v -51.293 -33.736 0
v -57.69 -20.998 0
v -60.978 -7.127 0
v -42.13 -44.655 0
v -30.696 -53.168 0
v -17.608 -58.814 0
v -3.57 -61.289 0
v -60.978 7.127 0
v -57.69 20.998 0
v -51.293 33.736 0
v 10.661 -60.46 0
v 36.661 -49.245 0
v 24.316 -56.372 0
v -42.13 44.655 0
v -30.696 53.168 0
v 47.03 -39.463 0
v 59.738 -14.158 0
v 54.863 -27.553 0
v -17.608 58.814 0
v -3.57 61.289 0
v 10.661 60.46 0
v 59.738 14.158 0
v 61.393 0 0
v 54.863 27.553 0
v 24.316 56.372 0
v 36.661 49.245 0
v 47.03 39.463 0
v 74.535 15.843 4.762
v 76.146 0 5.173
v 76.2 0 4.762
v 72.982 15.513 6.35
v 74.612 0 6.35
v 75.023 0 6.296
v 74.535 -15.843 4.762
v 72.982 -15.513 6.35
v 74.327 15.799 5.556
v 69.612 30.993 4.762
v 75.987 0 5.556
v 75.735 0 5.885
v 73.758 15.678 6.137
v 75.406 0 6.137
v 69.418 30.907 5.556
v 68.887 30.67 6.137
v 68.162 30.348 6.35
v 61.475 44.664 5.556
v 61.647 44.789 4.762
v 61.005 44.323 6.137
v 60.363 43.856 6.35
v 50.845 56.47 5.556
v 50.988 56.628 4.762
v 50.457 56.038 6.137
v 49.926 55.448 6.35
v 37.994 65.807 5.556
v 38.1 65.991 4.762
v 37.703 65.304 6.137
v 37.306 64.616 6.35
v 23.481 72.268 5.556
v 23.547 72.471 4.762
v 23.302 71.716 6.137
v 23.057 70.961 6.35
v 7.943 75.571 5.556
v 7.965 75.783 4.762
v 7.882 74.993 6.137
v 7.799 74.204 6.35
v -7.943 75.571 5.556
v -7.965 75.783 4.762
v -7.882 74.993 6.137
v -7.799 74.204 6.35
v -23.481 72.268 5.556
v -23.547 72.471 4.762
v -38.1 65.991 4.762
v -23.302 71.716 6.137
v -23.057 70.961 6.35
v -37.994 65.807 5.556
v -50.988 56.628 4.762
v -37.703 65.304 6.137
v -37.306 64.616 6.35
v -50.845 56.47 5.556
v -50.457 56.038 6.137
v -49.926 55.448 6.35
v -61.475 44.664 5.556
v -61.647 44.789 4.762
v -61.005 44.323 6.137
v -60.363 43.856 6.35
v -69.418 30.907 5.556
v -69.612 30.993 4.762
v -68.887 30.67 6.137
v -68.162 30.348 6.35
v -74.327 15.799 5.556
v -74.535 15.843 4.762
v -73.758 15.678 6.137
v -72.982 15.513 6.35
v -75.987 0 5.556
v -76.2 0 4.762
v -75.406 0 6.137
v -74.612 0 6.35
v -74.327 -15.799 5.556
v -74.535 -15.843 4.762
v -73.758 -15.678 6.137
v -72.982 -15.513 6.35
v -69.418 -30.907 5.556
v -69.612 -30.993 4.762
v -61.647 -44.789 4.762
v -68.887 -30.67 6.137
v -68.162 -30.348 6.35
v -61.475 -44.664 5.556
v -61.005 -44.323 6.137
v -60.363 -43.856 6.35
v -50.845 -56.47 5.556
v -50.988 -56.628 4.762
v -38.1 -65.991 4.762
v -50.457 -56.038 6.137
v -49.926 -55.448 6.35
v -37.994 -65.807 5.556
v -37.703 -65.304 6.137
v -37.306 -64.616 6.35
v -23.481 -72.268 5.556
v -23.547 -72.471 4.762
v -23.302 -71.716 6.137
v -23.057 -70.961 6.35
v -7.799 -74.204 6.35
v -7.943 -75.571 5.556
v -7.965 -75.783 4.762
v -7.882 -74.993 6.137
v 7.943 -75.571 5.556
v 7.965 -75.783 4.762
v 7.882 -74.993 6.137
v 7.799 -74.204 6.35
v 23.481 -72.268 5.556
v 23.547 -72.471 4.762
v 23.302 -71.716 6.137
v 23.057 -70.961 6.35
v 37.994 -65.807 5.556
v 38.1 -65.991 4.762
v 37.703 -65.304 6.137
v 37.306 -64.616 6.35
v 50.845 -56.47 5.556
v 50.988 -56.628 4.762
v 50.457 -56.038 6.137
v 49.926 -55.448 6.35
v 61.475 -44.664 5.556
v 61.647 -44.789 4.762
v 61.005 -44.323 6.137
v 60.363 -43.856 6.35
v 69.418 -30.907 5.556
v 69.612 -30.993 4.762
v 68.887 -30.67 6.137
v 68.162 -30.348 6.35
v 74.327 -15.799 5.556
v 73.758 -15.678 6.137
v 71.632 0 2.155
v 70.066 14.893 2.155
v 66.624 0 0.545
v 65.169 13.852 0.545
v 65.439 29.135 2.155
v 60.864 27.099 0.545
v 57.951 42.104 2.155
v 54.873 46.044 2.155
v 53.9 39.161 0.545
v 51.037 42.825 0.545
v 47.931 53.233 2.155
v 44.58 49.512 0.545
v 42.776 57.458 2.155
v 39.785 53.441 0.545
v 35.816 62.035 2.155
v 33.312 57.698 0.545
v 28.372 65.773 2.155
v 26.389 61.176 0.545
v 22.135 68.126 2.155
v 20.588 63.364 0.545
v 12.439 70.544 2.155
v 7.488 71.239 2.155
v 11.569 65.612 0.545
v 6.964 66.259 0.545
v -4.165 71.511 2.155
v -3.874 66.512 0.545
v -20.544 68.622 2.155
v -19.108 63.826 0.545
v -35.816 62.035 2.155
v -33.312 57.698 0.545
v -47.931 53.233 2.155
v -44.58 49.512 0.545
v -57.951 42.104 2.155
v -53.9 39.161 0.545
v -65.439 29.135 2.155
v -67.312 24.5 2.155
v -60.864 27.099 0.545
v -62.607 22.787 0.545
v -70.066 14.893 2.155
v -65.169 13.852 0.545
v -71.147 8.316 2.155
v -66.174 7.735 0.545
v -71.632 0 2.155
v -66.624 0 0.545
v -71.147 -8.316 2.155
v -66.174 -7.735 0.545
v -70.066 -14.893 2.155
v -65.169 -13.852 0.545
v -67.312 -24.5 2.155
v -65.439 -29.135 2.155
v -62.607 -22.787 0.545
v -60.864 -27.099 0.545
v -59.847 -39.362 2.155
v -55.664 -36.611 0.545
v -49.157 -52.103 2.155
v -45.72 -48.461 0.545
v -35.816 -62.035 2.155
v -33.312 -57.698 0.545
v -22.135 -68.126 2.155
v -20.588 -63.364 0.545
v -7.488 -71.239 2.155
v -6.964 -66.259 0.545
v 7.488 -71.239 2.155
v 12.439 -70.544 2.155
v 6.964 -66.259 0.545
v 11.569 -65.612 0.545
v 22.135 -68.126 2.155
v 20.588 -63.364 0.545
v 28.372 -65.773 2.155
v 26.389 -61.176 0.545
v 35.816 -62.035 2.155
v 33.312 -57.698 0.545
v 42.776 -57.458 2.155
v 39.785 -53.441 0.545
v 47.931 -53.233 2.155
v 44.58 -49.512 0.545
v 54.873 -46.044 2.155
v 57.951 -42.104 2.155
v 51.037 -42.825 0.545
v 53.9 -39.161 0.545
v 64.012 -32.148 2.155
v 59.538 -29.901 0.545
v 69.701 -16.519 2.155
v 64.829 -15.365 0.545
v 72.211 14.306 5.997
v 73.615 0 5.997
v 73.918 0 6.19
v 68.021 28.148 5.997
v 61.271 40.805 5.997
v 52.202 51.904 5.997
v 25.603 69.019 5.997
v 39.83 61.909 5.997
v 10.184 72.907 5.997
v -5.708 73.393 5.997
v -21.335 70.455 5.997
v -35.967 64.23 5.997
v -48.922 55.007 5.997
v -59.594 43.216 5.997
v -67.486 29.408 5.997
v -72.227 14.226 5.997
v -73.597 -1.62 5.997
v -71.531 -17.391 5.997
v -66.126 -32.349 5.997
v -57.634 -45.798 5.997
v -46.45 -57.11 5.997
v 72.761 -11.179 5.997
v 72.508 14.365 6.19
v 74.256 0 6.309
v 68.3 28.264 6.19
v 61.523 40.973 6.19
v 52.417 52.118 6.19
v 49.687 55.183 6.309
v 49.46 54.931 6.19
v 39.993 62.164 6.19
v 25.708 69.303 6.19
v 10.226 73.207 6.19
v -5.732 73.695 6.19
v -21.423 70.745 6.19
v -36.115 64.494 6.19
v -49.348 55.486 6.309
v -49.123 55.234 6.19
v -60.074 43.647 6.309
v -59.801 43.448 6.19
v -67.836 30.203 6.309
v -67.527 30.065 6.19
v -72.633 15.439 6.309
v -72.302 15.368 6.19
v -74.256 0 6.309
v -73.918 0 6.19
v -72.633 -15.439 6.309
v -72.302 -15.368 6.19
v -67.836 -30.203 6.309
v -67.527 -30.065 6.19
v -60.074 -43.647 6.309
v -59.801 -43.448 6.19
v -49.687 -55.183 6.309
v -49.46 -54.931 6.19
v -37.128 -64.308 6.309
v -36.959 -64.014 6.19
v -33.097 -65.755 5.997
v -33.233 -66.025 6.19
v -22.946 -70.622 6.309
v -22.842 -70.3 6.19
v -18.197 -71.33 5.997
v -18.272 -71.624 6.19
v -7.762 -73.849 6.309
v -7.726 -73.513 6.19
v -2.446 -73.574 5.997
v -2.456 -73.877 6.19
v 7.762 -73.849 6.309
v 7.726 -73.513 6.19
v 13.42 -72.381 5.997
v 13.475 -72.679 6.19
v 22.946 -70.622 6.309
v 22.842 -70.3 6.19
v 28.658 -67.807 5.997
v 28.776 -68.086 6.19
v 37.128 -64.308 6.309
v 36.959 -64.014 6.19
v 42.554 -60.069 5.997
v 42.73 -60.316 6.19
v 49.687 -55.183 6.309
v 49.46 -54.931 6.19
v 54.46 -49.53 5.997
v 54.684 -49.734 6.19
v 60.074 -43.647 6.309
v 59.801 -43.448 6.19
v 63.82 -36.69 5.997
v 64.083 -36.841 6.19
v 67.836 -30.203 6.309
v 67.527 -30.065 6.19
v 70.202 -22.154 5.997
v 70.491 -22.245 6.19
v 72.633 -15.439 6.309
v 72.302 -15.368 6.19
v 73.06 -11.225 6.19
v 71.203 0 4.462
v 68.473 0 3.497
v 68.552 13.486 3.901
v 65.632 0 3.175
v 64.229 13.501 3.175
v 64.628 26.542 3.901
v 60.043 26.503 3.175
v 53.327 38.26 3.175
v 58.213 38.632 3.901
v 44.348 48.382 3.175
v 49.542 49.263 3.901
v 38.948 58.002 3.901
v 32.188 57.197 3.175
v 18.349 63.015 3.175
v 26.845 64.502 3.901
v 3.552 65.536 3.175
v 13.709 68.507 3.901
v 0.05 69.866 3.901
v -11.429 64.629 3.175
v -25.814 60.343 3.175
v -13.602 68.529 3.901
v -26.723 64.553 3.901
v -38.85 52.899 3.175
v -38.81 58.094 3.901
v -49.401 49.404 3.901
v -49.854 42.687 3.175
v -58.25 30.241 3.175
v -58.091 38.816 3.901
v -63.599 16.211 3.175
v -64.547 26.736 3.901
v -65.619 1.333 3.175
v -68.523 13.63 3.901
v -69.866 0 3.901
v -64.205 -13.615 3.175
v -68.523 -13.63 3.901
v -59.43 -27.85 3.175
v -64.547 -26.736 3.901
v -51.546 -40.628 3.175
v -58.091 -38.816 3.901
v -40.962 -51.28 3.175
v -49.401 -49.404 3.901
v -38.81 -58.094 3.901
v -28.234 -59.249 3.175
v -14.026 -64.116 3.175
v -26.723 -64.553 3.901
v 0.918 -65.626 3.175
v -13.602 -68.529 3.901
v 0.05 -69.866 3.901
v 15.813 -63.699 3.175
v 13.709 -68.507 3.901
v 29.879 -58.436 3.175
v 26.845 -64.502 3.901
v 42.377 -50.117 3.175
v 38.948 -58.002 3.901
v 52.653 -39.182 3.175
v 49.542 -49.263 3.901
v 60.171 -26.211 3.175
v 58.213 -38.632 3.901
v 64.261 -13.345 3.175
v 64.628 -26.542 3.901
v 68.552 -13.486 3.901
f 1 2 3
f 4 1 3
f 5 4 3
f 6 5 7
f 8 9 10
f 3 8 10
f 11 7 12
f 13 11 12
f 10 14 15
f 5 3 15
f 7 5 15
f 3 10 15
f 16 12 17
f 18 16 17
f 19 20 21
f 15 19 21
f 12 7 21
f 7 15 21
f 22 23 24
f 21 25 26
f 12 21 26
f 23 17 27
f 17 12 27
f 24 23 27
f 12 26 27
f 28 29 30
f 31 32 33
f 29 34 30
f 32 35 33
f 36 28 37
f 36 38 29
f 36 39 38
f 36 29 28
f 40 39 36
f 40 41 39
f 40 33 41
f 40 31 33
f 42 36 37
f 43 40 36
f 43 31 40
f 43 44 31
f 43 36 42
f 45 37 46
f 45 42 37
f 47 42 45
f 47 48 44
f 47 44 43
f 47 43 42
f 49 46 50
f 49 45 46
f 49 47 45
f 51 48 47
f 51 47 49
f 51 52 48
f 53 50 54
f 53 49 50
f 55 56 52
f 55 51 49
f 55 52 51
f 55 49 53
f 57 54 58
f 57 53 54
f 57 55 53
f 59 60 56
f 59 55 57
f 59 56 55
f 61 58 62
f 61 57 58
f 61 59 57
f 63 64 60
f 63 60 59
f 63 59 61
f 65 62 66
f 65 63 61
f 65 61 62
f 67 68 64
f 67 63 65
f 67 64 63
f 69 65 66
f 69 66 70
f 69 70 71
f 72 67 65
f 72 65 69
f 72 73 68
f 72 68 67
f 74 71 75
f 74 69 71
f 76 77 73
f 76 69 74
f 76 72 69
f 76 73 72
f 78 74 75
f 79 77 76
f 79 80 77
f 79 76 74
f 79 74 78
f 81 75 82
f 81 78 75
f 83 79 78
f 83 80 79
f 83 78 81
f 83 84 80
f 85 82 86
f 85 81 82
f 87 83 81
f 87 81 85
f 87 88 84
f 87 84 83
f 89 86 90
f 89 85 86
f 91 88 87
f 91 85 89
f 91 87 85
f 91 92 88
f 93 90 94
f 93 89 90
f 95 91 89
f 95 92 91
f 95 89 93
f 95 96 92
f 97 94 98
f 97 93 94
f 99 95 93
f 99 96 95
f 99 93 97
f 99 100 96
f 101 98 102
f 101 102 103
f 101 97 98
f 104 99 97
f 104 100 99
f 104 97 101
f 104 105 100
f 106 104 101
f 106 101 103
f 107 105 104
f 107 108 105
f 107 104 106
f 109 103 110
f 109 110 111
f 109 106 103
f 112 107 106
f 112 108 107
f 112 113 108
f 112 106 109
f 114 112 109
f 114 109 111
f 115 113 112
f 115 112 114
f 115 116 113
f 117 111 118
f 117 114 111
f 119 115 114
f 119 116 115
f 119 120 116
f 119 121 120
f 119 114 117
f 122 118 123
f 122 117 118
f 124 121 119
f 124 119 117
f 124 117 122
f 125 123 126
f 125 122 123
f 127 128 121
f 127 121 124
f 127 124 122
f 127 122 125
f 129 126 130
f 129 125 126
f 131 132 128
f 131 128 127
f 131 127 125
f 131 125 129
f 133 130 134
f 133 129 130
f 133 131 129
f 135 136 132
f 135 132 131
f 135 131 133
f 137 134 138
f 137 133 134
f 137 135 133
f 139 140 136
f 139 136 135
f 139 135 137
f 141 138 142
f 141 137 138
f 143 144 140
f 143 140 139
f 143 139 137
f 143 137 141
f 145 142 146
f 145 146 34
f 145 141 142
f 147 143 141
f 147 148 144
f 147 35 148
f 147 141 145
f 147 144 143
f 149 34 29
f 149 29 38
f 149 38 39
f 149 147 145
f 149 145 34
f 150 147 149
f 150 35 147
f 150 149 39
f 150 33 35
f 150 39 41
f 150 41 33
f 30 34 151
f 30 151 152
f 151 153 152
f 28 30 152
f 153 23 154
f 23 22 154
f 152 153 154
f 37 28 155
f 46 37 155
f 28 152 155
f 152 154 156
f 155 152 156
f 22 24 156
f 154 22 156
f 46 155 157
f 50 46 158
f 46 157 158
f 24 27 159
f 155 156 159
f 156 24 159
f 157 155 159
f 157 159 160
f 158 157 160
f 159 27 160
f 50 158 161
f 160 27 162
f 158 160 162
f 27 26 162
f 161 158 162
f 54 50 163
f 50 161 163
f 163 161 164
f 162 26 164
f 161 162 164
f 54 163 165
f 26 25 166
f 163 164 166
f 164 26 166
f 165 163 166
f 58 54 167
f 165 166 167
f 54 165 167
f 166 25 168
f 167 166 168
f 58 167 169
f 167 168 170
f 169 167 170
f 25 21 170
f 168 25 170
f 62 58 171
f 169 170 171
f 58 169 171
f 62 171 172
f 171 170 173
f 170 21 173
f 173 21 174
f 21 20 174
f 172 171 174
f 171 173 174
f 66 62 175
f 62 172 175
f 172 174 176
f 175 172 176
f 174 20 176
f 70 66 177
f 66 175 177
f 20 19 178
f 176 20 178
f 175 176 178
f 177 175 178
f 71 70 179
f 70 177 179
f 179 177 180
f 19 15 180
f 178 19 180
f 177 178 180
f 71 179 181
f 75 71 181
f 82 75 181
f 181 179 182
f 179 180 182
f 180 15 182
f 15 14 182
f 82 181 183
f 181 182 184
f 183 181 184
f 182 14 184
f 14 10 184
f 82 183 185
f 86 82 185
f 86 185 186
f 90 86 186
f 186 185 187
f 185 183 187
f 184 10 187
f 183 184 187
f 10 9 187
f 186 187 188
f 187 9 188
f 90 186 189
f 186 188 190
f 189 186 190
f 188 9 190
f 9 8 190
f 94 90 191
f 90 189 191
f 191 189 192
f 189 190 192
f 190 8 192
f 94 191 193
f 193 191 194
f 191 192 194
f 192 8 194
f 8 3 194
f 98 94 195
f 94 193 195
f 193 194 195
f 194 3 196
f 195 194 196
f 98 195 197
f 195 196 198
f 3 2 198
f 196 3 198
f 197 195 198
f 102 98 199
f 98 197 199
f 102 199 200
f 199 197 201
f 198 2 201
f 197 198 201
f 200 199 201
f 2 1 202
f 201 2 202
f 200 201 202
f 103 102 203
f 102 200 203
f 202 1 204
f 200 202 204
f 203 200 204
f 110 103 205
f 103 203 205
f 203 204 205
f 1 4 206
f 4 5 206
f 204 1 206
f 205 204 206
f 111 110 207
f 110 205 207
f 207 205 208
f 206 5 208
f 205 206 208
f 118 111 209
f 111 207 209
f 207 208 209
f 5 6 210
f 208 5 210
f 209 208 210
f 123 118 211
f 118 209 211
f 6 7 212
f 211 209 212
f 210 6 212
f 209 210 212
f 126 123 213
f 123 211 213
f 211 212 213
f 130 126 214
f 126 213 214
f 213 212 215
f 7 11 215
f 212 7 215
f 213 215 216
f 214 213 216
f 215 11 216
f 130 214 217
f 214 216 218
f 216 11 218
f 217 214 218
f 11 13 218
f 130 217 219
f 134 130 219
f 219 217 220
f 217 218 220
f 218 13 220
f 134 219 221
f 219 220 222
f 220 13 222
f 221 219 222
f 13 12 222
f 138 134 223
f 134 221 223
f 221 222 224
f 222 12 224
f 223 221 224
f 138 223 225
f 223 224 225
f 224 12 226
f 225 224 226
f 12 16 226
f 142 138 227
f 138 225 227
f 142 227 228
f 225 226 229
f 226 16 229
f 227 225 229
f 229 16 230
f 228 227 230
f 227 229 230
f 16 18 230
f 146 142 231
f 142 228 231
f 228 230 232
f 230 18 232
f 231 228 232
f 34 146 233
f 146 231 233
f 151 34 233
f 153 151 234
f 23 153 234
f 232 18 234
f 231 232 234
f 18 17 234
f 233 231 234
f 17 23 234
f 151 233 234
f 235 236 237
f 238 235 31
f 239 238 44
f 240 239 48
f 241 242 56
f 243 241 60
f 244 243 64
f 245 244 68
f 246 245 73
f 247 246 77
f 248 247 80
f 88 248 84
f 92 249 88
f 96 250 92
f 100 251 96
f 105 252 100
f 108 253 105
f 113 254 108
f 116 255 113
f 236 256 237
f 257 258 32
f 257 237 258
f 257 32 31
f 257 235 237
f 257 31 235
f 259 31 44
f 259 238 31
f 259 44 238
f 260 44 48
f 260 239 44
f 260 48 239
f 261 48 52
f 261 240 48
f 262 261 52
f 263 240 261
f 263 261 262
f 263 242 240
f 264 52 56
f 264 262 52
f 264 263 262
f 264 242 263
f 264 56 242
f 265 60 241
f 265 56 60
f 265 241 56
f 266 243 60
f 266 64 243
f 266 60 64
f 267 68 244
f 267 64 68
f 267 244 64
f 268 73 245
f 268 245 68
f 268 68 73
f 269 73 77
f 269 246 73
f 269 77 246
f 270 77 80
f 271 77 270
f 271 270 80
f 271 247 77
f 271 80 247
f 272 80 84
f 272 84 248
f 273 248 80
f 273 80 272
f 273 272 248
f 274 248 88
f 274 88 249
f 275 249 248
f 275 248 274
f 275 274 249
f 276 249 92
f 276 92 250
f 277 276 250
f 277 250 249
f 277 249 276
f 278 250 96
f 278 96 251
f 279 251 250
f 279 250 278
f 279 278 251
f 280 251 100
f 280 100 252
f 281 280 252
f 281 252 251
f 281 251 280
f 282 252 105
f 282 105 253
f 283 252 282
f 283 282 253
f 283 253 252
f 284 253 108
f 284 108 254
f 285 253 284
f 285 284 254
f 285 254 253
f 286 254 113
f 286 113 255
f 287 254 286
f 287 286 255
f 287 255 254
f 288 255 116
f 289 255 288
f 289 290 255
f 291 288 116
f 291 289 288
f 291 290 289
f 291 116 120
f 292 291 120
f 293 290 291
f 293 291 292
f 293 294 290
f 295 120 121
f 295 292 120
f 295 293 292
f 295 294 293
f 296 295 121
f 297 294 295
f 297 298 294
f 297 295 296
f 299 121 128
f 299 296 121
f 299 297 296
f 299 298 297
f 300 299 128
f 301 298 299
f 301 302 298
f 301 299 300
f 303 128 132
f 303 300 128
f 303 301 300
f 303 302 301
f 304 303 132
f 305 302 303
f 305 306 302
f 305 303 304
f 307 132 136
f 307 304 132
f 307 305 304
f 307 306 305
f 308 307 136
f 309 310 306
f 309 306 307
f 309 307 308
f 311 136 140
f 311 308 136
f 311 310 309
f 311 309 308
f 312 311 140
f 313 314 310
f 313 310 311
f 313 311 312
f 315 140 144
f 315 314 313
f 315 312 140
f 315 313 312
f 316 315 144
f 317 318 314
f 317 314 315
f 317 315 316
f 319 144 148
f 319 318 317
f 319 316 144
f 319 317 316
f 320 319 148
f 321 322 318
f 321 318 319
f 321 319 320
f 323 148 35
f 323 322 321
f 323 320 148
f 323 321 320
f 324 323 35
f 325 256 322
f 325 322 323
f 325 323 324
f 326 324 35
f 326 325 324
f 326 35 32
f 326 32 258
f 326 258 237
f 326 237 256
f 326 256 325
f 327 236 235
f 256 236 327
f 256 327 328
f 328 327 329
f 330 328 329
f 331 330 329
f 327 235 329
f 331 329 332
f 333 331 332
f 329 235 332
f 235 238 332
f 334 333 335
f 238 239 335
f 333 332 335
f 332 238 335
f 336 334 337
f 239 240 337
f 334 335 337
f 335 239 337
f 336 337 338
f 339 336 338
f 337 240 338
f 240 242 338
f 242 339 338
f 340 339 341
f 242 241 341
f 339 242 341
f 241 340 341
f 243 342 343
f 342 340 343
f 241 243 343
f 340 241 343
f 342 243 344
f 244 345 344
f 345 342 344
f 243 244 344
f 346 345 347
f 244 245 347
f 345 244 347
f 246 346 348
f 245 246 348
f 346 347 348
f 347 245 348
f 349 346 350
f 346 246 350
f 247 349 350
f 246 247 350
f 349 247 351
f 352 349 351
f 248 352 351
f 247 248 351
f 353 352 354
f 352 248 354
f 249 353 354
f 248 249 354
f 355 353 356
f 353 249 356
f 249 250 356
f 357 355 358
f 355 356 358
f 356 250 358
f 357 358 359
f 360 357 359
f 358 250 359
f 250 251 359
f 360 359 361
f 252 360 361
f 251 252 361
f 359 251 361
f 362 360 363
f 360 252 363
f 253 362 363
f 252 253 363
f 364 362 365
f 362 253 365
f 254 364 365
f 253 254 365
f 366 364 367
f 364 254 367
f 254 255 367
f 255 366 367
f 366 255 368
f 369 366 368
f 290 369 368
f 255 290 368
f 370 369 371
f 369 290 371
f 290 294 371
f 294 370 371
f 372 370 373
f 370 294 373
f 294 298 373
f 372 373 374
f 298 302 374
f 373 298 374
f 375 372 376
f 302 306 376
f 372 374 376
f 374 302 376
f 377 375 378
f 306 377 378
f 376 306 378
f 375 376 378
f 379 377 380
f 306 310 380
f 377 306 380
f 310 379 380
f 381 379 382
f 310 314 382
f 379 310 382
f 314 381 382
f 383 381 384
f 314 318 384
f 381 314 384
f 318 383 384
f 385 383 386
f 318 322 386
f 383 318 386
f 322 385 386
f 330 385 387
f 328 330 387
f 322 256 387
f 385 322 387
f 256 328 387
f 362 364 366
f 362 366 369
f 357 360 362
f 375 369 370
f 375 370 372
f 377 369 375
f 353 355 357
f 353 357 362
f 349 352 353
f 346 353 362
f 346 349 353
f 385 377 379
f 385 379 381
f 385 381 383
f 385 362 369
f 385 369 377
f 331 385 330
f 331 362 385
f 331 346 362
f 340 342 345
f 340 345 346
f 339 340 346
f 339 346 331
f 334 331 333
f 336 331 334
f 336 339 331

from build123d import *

# Parameters (mm, degrees)
F0_R     = 76.2
F1_DEPTH = 6.35
F2_R     = 73.025
F3_DEPTH = 3.175
F5_R     = 12.7


# Not quite as in the source:
# - a fillet or chamfer that OpenCascade refuses, or shapes differently, is made with other operations: its cross-section is extruded or revolved along the edge and cut away or added


with BuildPart() as f1:
    # F0 (on Top) → F1 (new body)
    with BuildSketch(Plane.XY):
        Circle(F0_R)
    extrude(amount=F1_DEPTH)

    # F2 (on face) → F3 (cut)
    with BuildSketch(Plane.XY.offset(6.35)):
        Circle(F2_R)
    extrude(amount=-F3_DEPTH, mode=Mode.SUBTRACT)

    # F4: fillet of radius 1.5875 on 2 edges, made by hand

    # F4_s1 → F4_t2 (revolve, cut)
    with BuildSketch(Plane.XZ):
        with BuildLine():
            ThreePointArc((74.6125, 6.35), (73.4899679849, 5.8850320151), (73.025, 4.7625))
            Line((73.025, 4.7625), (73.025, 6.35))
            Line((73.025, 6.35), (74.6125, 6.35))
        make_face()
    revolve(axis=Axis((0, 0, 6.35), (0, 0, 1)), mode=Mode.SUBTRACT)

    # F4_s3 → F4_t4 (revolve, cut)
    with BuildSketch(Plane.XZ):
        with BuildLine():
            ThreePointArc((76.2, 4.7625), (75.7350320151, 5.8850320151), (74.6125, 6.35))
            Line((74.6125, 6.35), (76.2, 6.35))
            Line((76.2, 6.35), (76.2, 4.7625))
        make_face()
    revolve(axis=Axis((0, 0, 6.35), (0, 0, 1)), mode=Mode.SUBTRACT)

    # F5
    f5_edges = [f1.edges().sort_by_distance(p)[0] for p in [
        (-73.025, 0, 3.175),
    ]]
    fillet(f5_edges, radius=F5_R)

    # F6: fillet of radius 25.4 on 1 edges, made by hand

    # F6_s1 → F6_t2 (revolve, cut)
    with BuildSketch(Plane.XZ):
        with BuildLine():
            ThreePointArc((76.2, 4.7625), (69.1699156866, 1.2199203889), (61.3927857532, 0))
            Line((61.3927857532, 0), (61.3927857532, -0.508))
            Line((61.3927857532, -0.508), (76.2, -0.508))
            Line((76.2, -0.508), (76.708, 0))
            ThreePointArc((76.708, 0), (76.708, 2.38125), (76.4961442849, 4.34975))
            Line((76.4961442849, 4.34975), (76.2, 4.7625))
        make_face()
    revolve(axis=Axis((0, 0, 0), (0, 0, 1)), mode=Mode.SUBTRACT)


solid = f1.part
